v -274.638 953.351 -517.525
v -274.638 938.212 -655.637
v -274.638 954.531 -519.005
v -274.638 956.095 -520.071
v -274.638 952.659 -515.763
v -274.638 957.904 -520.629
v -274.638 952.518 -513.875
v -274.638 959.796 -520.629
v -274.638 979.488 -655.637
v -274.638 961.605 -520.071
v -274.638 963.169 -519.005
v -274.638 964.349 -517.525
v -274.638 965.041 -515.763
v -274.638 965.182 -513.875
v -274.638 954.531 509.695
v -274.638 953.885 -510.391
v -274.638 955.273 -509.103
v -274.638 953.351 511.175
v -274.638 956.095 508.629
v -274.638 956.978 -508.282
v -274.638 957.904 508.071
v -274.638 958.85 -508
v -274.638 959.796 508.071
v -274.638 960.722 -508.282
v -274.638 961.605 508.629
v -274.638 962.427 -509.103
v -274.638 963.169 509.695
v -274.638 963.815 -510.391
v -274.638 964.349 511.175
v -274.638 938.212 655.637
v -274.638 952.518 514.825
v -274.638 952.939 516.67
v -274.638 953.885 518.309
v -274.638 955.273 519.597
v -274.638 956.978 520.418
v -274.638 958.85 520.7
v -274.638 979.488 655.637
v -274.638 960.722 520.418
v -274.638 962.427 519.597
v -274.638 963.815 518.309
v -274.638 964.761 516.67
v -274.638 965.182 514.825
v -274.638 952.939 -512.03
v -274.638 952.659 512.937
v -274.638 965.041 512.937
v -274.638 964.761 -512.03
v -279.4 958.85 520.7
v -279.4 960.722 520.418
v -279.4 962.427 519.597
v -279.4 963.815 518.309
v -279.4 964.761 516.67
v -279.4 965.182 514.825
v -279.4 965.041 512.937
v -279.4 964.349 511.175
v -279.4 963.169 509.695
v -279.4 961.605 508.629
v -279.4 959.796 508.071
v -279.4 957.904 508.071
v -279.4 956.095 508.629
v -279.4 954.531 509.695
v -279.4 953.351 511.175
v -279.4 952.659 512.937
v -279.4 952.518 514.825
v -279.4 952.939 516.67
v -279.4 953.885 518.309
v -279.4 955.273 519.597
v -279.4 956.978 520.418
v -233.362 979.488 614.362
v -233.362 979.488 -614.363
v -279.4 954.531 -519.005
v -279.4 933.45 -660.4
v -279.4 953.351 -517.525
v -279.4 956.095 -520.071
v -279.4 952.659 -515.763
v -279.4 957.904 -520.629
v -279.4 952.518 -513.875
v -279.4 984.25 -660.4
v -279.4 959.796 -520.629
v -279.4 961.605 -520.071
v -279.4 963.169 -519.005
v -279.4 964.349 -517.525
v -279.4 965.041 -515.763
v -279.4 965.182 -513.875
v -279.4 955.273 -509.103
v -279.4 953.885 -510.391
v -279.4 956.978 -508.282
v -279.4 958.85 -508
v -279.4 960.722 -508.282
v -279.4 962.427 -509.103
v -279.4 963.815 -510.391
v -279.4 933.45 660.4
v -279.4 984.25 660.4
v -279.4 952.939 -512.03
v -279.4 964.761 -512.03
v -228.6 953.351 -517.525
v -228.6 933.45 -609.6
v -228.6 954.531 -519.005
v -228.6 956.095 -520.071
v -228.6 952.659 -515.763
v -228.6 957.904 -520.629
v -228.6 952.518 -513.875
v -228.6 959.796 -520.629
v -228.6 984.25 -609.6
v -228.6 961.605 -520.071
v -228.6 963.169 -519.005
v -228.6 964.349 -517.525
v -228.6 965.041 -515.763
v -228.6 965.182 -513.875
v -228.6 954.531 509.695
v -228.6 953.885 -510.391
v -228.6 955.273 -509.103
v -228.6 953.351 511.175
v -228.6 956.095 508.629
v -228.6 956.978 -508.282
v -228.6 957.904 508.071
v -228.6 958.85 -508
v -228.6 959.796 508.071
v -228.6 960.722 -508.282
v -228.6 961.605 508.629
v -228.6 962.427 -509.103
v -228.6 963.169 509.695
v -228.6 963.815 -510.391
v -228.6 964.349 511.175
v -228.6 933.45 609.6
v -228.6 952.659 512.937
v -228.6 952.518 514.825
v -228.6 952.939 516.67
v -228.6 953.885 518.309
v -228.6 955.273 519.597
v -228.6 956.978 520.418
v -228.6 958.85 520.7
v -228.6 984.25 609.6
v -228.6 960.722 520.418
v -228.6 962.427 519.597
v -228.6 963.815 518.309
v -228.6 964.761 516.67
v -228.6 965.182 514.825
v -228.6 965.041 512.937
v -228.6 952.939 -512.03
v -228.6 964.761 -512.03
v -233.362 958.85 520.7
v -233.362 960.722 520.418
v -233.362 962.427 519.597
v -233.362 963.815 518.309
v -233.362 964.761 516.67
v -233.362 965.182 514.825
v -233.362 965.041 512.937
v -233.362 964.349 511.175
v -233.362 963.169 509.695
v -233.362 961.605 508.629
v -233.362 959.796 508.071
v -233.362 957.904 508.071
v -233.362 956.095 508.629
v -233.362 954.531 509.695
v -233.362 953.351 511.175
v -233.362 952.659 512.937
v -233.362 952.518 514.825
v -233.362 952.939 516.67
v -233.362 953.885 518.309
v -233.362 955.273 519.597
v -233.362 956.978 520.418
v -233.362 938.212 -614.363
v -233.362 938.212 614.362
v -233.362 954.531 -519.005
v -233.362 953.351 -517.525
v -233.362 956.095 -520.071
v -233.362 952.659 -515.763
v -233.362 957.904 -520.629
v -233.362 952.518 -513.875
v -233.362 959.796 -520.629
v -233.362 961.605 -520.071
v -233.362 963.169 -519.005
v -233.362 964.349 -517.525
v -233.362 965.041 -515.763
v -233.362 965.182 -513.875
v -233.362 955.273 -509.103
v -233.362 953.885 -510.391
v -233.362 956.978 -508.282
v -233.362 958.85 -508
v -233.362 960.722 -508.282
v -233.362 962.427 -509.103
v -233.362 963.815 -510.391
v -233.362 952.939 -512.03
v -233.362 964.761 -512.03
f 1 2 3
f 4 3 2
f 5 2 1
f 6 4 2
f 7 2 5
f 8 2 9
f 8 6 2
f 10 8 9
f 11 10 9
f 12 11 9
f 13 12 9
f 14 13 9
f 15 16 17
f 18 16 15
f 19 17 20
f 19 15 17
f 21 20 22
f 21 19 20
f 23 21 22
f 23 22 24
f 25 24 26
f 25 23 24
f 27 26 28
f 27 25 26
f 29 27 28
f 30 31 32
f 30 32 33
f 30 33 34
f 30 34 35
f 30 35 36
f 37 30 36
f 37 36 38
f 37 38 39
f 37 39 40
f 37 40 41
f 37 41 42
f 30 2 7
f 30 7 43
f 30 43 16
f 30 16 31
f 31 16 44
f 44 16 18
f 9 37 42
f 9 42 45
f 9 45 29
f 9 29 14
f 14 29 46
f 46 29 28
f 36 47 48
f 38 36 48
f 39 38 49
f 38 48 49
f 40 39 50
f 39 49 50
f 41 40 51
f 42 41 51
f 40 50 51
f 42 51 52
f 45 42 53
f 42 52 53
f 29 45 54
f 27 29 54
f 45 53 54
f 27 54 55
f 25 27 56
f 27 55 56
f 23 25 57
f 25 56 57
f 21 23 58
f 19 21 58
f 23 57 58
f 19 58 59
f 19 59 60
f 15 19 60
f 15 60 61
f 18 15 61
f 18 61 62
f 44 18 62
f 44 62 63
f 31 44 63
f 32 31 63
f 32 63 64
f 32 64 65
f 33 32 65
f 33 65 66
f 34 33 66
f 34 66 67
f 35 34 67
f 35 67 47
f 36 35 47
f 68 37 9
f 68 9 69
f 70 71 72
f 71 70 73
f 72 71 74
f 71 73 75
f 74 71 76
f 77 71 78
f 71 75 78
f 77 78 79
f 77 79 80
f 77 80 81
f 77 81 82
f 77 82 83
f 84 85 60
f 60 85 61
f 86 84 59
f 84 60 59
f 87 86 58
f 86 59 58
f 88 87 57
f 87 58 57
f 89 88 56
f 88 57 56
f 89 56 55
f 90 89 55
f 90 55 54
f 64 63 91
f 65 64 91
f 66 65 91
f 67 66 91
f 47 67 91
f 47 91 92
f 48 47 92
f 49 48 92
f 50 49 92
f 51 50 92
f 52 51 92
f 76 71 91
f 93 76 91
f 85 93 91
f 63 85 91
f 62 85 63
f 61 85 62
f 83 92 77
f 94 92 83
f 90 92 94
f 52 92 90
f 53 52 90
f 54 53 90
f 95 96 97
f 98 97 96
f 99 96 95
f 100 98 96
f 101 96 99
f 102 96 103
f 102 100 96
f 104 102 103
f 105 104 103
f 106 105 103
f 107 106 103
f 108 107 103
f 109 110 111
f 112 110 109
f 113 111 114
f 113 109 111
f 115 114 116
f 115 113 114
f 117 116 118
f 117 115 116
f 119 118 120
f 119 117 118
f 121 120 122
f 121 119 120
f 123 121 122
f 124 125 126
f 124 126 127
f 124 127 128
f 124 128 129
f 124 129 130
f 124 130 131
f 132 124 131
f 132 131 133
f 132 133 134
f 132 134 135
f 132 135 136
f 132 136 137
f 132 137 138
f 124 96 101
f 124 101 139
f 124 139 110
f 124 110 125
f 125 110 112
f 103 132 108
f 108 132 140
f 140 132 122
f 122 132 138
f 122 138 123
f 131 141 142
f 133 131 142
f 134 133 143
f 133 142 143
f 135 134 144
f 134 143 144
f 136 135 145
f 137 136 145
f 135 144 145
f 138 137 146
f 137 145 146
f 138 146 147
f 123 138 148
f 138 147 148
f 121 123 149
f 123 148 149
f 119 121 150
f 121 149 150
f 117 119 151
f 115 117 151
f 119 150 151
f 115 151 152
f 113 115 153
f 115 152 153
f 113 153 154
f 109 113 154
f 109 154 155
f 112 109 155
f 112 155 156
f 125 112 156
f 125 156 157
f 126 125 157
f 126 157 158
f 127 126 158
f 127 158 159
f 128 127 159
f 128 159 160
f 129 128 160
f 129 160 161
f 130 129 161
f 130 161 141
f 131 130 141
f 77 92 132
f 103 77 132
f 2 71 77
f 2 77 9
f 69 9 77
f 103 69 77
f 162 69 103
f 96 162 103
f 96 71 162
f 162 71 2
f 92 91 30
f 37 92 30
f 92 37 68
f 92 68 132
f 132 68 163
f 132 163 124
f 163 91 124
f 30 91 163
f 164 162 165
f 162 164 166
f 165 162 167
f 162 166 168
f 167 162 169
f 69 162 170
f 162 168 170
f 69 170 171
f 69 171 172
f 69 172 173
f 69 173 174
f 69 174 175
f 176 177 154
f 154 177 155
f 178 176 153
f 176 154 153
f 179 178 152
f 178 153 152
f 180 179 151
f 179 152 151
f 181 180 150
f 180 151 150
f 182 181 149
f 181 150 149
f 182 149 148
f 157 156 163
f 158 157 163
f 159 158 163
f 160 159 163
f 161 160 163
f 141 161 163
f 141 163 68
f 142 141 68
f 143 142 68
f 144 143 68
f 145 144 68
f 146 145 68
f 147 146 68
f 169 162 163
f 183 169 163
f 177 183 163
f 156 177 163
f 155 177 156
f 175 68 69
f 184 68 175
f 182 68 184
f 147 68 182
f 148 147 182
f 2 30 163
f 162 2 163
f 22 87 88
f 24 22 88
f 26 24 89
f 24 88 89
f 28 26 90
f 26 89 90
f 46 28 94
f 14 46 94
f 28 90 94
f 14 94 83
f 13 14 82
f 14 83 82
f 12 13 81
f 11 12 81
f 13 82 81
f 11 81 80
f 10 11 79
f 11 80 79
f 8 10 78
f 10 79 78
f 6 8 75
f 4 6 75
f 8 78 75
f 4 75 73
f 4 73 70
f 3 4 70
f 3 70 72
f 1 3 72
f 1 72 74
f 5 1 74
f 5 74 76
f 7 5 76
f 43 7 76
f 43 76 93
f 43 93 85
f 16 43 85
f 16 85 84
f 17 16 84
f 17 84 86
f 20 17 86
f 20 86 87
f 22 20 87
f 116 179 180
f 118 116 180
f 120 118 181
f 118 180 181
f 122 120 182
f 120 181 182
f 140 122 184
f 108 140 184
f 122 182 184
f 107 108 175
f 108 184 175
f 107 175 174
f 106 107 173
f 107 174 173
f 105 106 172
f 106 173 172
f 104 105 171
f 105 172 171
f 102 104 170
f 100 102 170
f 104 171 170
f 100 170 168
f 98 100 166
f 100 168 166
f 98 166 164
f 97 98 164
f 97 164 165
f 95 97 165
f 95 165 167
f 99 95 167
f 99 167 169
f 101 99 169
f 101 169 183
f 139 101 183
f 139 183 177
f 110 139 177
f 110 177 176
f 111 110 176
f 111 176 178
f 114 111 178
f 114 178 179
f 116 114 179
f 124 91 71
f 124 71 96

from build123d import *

# Parameters (mm, degrees)
SKETCH1_W           = 50.8
SKETCH1_H           = 50.8
SKETCH1_W_2         = 41.275
SKETCH1_H_2         = 41.275
EXTRUDE_THIN1_DEPTH = 660.4
CUT_EXTRUDE1_DEPTH  = 51.8
SKETCH4_R           = 6.35
CUT_EXTRUDE2_DEPTH  = 51.8


with BuildPart() as part:
    # Sketch1 → Extrude-Thin1 (new body, symmetric)
    with BuildSketch(Plane.XY):
        with Locations((-254, 958.85)):
            Rectangle(SKETCH1_W, SKETCH1_H)
        with Locations((-254, 958.85)):
            Rectangle(SKETCH1_W_2, SKETCH1_H_2, mode=Mode.SUBTRACT)
    extrude(amount=EXTRUDE_THIN1_DEPTH, both=True)

    # Sketch3 → Cut-Extrude1 (cut, through all)
    with BuildSketch(Plane.XZ.offset(-933.45)):
        Polygon((-279.4, 660.4), (-228.6, 609.6), (-228.6, 660.4), align=None)
        Polygon((-279.4, -660.4), (-228.6, -609.6), (-228.6, -660.4), align=None)
    extrude(amount=-CUT_EXTRUDE1_DEPTH, mode=Mode.SUBTRACT)

    # Sketch4 → Cut-Extrude2 (cut, through all)
    with BuildSketch(Plane.ZY.offset(279.4)):
        with Locations((514.35, 958.85)):
            Circle(SKETCH4_R)
        with Locations((-514.35, 958.85)):
            Circle(SKETCH4_R)
    extrude(amount=-CUT_EXTRUDE2_DEPTH, mode=Mode.SUBTRACT)


solid = part.part
